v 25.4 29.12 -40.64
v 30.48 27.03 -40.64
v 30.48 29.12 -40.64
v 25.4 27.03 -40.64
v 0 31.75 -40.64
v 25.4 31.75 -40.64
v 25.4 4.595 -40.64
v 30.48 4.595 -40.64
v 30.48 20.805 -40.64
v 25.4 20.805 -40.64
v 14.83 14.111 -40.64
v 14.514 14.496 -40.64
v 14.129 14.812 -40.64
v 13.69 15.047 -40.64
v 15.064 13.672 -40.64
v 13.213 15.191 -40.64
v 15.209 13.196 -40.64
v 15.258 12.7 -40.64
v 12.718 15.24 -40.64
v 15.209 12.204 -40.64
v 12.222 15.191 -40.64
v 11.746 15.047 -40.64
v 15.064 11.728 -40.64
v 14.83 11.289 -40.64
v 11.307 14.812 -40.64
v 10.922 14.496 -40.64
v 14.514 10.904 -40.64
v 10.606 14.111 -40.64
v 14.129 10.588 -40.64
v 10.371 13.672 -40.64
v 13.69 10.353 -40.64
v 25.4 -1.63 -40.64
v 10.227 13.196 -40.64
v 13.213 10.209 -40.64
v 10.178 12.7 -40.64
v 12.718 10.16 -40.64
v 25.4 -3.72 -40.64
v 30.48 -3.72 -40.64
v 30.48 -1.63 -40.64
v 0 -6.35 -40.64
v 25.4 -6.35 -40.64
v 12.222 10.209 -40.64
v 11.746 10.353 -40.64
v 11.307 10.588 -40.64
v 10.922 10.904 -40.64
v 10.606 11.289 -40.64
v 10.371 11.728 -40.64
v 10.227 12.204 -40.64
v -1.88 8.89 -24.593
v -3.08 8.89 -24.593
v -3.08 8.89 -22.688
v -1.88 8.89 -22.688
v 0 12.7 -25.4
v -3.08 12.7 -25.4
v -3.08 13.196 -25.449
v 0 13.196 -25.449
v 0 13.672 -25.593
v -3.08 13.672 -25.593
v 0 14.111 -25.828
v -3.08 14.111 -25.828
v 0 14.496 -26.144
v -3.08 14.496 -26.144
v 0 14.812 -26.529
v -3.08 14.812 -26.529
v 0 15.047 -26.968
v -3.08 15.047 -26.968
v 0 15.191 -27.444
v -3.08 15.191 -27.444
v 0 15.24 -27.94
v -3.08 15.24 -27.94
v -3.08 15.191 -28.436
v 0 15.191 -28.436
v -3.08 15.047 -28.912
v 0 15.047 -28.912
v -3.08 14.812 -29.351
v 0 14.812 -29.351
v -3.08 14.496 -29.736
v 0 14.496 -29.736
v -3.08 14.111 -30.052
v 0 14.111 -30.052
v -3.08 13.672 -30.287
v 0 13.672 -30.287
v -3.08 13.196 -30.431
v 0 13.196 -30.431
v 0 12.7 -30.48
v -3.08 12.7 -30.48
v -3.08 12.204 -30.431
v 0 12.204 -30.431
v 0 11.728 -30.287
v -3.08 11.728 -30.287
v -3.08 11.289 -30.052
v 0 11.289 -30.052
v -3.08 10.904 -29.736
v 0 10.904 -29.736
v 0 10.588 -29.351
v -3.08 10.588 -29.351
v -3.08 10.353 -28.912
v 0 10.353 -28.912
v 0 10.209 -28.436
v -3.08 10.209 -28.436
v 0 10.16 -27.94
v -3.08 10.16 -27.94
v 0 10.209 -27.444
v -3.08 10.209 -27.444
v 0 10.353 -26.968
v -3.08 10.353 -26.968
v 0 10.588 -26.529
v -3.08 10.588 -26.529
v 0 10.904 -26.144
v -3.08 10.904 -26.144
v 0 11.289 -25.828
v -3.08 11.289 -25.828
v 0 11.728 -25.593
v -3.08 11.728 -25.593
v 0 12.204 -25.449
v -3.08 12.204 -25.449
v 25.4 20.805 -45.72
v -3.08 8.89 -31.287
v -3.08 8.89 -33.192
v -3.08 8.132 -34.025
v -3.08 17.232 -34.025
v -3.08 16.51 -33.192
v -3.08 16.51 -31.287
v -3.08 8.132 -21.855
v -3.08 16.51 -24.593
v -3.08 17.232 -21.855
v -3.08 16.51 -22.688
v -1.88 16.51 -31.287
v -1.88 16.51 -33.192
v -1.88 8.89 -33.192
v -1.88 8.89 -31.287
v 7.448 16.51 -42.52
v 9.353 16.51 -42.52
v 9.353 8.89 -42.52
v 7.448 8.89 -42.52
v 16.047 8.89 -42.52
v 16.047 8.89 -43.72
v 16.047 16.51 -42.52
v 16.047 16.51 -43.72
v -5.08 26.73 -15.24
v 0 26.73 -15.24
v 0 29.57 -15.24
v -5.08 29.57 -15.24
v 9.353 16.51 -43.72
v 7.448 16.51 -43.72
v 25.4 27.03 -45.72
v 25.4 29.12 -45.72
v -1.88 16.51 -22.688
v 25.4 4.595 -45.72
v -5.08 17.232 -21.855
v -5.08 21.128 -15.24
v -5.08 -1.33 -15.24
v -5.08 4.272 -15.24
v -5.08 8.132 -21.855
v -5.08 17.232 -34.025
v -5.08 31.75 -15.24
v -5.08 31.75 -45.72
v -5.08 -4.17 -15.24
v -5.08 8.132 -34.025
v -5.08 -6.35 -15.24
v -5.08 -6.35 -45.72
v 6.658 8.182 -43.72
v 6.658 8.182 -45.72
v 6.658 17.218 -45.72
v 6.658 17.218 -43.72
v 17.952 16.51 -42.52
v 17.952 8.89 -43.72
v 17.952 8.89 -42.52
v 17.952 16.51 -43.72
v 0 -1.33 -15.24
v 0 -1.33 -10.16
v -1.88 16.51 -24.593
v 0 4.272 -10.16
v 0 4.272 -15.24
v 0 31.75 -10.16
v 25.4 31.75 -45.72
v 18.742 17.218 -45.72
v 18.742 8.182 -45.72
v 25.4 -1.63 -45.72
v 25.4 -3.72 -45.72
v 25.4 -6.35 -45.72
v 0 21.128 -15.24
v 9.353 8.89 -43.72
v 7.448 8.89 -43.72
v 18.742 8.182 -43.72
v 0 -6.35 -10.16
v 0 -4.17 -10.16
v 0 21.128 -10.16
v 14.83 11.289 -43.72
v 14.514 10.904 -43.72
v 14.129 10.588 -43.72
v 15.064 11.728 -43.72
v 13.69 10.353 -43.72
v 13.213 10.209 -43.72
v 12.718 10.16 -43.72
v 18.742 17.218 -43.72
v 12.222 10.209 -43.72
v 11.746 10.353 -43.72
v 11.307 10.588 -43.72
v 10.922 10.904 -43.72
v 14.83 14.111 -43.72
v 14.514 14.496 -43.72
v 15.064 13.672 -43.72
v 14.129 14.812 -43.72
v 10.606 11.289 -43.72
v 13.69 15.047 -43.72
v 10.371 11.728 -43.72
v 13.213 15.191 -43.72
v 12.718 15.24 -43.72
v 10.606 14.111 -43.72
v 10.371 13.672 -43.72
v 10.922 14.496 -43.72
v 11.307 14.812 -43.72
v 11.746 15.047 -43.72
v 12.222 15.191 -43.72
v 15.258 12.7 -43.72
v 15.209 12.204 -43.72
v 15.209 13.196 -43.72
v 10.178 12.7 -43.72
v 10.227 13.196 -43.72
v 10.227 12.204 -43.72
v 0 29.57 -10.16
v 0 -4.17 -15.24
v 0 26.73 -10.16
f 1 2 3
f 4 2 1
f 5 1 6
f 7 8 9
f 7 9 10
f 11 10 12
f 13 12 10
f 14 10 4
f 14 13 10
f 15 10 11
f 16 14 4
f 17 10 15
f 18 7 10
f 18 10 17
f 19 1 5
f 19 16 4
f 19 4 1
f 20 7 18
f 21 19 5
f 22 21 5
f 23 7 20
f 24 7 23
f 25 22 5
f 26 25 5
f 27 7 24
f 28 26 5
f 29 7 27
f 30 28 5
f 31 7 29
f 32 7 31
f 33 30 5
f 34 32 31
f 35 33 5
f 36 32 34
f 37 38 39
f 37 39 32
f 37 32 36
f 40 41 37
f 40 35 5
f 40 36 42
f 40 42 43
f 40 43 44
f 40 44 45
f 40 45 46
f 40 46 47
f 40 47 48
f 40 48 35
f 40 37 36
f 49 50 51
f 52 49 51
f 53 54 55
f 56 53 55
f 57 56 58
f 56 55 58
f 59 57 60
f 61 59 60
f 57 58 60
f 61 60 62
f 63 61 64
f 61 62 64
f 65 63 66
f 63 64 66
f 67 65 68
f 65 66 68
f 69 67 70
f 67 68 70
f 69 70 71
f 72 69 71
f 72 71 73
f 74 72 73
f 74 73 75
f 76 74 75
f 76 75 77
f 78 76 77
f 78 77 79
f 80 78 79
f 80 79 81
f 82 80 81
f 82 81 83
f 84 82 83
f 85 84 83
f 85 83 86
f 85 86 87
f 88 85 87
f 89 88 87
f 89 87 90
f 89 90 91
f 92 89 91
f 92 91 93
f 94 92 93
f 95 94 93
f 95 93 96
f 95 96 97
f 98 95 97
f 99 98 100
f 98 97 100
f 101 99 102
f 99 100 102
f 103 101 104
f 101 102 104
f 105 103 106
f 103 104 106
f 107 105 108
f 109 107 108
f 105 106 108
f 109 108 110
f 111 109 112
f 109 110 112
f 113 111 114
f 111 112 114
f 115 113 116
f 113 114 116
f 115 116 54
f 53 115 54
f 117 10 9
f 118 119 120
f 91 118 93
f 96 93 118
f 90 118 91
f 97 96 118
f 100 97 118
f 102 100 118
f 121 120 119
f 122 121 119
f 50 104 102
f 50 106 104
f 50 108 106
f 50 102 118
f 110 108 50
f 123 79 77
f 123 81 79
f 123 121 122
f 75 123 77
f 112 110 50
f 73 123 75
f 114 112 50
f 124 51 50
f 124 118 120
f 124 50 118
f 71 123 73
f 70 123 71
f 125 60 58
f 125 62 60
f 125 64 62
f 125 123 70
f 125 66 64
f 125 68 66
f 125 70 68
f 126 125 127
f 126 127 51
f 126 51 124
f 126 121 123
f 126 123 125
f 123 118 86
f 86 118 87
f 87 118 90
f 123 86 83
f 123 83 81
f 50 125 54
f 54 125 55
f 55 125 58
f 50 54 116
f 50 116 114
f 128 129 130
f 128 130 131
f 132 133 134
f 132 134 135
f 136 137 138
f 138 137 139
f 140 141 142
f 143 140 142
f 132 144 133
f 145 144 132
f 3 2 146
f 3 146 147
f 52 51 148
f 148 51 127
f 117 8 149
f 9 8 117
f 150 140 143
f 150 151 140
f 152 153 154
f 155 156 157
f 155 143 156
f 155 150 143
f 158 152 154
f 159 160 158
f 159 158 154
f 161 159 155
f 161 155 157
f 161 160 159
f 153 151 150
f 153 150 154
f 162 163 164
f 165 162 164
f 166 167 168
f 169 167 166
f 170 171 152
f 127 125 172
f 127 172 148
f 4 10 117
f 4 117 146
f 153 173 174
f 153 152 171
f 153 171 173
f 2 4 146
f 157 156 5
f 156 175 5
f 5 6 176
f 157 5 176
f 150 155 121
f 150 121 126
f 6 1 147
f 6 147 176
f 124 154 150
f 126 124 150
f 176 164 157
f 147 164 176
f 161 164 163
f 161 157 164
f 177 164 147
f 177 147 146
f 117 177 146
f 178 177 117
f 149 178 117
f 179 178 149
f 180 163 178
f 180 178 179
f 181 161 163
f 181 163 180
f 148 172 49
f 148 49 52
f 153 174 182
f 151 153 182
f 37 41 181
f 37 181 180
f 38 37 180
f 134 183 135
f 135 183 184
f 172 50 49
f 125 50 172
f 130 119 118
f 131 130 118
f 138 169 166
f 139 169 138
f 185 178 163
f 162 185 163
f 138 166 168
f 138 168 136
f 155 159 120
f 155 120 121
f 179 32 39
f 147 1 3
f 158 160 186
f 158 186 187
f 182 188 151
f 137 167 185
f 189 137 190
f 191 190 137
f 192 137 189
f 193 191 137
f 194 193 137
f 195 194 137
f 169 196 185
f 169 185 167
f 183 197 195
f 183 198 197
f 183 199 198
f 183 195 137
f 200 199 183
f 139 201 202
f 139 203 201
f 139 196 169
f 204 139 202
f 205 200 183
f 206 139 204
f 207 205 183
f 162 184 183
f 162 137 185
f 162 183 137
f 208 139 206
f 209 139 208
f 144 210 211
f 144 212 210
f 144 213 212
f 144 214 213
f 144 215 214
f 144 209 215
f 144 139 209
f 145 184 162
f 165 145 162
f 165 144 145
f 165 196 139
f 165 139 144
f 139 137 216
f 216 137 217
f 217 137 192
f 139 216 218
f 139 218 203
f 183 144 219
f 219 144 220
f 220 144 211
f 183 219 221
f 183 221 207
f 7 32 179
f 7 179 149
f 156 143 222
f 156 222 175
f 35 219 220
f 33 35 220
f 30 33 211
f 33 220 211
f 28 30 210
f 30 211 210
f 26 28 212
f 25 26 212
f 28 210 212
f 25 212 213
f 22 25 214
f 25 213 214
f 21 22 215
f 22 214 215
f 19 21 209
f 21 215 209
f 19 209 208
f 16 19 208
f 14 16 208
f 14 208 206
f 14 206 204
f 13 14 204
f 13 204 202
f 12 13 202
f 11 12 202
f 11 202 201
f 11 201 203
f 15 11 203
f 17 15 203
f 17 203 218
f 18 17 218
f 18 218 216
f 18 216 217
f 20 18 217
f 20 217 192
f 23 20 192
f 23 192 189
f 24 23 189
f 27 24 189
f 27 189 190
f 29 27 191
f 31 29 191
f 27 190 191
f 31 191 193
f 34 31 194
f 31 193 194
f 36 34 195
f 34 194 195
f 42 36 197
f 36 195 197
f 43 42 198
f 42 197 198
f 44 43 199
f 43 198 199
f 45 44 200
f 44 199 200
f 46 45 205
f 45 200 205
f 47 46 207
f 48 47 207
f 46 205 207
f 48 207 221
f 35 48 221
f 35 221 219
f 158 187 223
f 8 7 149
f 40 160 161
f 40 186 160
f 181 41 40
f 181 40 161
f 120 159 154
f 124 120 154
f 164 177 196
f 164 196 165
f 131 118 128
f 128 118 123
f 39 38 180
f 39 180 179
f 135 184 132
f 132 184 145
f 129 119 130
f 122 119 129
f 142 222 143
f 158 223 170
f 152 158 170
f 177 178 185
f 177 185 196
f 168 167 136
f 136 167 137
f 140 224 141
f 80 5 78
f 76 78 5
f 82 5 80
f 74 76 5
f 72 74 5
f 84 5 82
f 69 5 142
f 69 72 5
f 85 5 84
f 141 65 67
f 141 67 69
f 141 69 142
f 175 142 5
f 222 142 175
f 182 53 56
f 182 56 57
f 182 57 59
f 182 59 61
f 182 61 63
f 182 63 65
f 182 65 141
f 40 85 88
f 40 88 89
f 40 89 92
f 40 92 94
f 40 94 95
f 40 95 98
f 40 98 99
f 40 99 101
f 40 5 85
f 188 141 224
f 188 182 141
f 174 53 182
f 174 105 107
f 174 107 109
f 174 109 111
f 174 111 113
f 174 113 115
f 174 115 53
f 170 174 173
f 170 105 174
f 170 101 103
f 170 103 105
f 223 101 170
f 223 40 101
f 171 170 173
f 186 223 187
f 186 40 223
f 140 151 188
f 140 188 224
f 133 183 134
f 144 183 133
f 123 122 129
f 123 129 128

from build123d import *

# Parameters (mm, degrees)
BOSS_EXTRUDE1_DEPTH      = 31.75
BOSS_EXTRUDE1_DEPTH_BACK = 6.35
BODY_MOVE_COPY1_ANGLE    = 90
SKETCH24_W               = 5.08
SKETCH24_H               = 2.84
SKETCH24_H_2             = 16.856
SKETCH24_H_3             = 2.839999908
CUT_EXTRUDE4_DEPTH       = 64.461888563
SKETCH26_W               = 5.08
SKETCH26_H               = 6.225000088
SKETCH26_H_2             = 2.629999912
CUT_EXTRUDE5_DEPTH       = 54.536186827
CHAMFER1_SIZE            = 5.08
CHAMFER2_SIZE            = 5.08
SKETCH29_W               = 12.0839992
SKETCH29_H               = 9.0359992
CUT_EXTRUDE6_DEPTH       = 2
SKETCH28_W               = 12.16937175
SKETCH28_H               = 9.099837858
CUT_EXTRUDE7_DEPTH       = 2
CUT_EXTRUDE8_REACH       = 66.997
SKETCH38_R               = 2.54
CUT_EXTRUDE10_REACH      = 57.348
SKETCH40_R               = 2.54
SKETCH41_W               = 1.905
SKETCH41_H               = 7.62
CUT_EXTRUDE11_DEPTH      = 1.2
SKETCH42_W               = 1.905
SKETCH42_H               = 7.62
CUT_EXTRUDE12_DEPTH      = 1.2


with BuildPart() as part:
    # Sketch1 → Boss-Extrude1 (new, two sides: drawn at the far end of the back side and taken through both)
    with BuildSketch(Plane(origin=(0, 0, 0), x_dir=(1, 0, 0), z_dir=(0, 1, 0)).offset(-BOSS_EXTRUDE1_DEPTH_BACK)):
        Polygon((0, 0), (30.48, 0), (30.48, -5.08), (-5.08, -5.08), (-5.08, 30.48), (0, 30.48), align=None)
    extrude(amount=BOSS_EXTRUDE1_DEPTH + BOSS_EXTRUDE1_DEPTH_BACK)


with BuildPart() as part_1:
    # Body-Move/Copy1: moved
    add(part.part.rotate(Axis((-5.08, 0, 5.08), (0, -1, 0)), BODY_MOVE_COPY1_ANGLE))


with BuildPart() as part_2:
    # Body-Move/Copy2: moved
    add(part_1.part.moved(Location((0, 0, -25.4))))


with BuildPart() as part_3:
    # Body-Move/Copy3: moved
    add(part_2.part.moved(Location((0, 0, -25.4))))

    # Sketch24 → Cut-Extrude4 (cut, through all)
    with BuildSketch(Plane(origin=(0, 0, 0), x_dir=(0, 0, -1), z_dir=(1, 0, 0))):
        with Locations((12.7, 28.15)):
            Rectangle(SKETCH24_W, SKETCH24_H)
        with Locations((12.7, 12.7)):
            Rectangle(SKETCH24_W, SKETCH24_H_2)
        with Locations((12.7, -2.75)):
            Rectangle(SKETCH24_W, SKETCH24_H_3)
    extrude(amount=-CUT_EXTRUDE4_DEPTH, mode=Mode.SUBTRACT)

    # Sketch26 → Cut-Extrude5 (cut, through all)
    with BuildSketch(Plane.XY.offset(-40.64)):
        with Locations((27.94, 23.9175)):
            Rectangle(SKETCH26_W, SKETCH26_H)
        with Locations((27.94, 30.435000044)):
            Rectangle(SKETCH26_W, SKETCH26_H_2)
        with Locations((27.94, 1.4825)):
            Rectangle(SKETCH26_W, SKETCH26_H)
        with Locations((27.94, -5.035000044)):
            Rectangle(SKETCH26_W, SKETCH26_H_2)
    extrude(amount=-CUT_EXTRUDE5_DEPTH, mode=Mode.SUBTRACT)

    # Chamfer1
    chamfer1_edges = [part_3.edges().sort_by_distance(p)[0] for p in [
        (-5.08, -5.259999977, -10.16),
        (-5.08, 1.470999977, -10.16),
        (-5.08, 23.929, -10.16),
        (-5.08, 30.66, -10.16),
    ]]
    chamfer(chamfer1_edges, length=CHAMFER1_SIZE - 0.0001)  # a hair under: the kernel refuses the full size

    # Chamfer2
    chamfer2_edges = [part_3.edges().sort_by_distance(p)[0] for p in [
        (30.48, -2.675000066, -45.72),
        (30.48, 12.7, -45.72),
        (30.48, 28.075000066, -45.72),
    ]]
    chamfer(chamfer2_edges, length=CHAMFER2_SIZE - 0.0001)  # a hair under: the kernel refuses the full size

    # Sketch29 → Cut-Extrude6 (cut)
    with BuildSketch(Plane(origin=(0, 0, -45.72), x_dir=(-1, 0, 0), z_dir=(0, 0, -1))):
        with Locations((-12.7, 12.7)):
            Rectangle(SKETCH29_W, SKETCH29_H)
    extrude(amount=-CUT_EXTRUDE6_DEPTH, mode=Mode.SUBTRACT)

    # Sketch28 → Cut-Extrude7 (cut)
    with BuildSketch(Plane.ZY.offset(5.08)):
        with Locations((-27.94, 12.682393608)):
            Rectangle(SKETCH28_W, SKETCH28_H)
    extrude(amount=-CUT_EXTRUDE7_DEPTH, mode=Mode.SUBTRACT)

    # Sketch38 → Cut-Extrude8 (cut, up to next)
    with BuildSketch(Plane.ZY.offset(3.08), mode=Mode.PRIVATE) as cut_extrude8_sk1:
        with Locations((-27.94, 12.7)):
            Circle(SKETCH38_R)
    cut_extrude8_tool1 = extrude(cut_extrude8_sk1.sketch, amount=-CUT_EXTRUDE8_REACH, mode=Mode.PRIVATE) & part_3.part
    add(cut_extrude8_tool1.solids().sort_by_distance((-3.08, 12.7, -27.94))[0], mode=Mode.SUBTRACT)

    # Sketch40 → Cut-Extrude10 (cut, up to next)
    with BuildSketch(Plane(origin=(0, 0, -43.72), x_dir=(-1, 0, 0), z_dir=(0, 0, -1)), mode=Mode.PRIVATE) as cut_extrude10_sk1:
        with Locations((-12.717733491, 12.7)):
            Circle(SKETCH40_R)
    cut_extrude10_tool1 = extrude(cut_extrude10_sk1.sketch, amount=-CUT_EXTRUDE10_REACH, mode=Mode.PRIVATE) & part_3.part
    add(cut_extrude10_tool1.solids().sort_by_distance((12.717733, 12.7, -43.72))[0], mode=Mode.SUBTRACT)

    # Sketch41 → Cut-Extrude11 (cut)
    with BuildSketch(Plane(origin=(0, 0, -43.72), x_dir=(-1, 0, 0), z_dir=(0, 0, -1))):
        with Locations((-8.400133455, 12.7)):
            Rectangle(SKETCH41_W, SKETCH41_H)
        with Locations((-16.999866545, 12.7)):
            Rectangle(SKETCH41_W, SKETCH41_H)
    extrude(amount=-CUT_EXTRUDE11_DEPTH, mode=Mode.SUBTRACT)

    # Sketch42 → Cut-Extrude12 (cut)
    with BuildSketch(Plane.ZY.offset(3.08)):
        with Locations((-23.640133455, 12.7)):
            Rectangle(SKETCH42_W, SKETCH42_H)
        with Locations((-32.239866545, 12.7)):
            Rectangle(SKETCH42_W, SKETCH42_H)
    extrude(amount=-CUT_EXTRUDE12_DEPTH, mode=Mode.SUBTRACT)


solid = part_3.part
